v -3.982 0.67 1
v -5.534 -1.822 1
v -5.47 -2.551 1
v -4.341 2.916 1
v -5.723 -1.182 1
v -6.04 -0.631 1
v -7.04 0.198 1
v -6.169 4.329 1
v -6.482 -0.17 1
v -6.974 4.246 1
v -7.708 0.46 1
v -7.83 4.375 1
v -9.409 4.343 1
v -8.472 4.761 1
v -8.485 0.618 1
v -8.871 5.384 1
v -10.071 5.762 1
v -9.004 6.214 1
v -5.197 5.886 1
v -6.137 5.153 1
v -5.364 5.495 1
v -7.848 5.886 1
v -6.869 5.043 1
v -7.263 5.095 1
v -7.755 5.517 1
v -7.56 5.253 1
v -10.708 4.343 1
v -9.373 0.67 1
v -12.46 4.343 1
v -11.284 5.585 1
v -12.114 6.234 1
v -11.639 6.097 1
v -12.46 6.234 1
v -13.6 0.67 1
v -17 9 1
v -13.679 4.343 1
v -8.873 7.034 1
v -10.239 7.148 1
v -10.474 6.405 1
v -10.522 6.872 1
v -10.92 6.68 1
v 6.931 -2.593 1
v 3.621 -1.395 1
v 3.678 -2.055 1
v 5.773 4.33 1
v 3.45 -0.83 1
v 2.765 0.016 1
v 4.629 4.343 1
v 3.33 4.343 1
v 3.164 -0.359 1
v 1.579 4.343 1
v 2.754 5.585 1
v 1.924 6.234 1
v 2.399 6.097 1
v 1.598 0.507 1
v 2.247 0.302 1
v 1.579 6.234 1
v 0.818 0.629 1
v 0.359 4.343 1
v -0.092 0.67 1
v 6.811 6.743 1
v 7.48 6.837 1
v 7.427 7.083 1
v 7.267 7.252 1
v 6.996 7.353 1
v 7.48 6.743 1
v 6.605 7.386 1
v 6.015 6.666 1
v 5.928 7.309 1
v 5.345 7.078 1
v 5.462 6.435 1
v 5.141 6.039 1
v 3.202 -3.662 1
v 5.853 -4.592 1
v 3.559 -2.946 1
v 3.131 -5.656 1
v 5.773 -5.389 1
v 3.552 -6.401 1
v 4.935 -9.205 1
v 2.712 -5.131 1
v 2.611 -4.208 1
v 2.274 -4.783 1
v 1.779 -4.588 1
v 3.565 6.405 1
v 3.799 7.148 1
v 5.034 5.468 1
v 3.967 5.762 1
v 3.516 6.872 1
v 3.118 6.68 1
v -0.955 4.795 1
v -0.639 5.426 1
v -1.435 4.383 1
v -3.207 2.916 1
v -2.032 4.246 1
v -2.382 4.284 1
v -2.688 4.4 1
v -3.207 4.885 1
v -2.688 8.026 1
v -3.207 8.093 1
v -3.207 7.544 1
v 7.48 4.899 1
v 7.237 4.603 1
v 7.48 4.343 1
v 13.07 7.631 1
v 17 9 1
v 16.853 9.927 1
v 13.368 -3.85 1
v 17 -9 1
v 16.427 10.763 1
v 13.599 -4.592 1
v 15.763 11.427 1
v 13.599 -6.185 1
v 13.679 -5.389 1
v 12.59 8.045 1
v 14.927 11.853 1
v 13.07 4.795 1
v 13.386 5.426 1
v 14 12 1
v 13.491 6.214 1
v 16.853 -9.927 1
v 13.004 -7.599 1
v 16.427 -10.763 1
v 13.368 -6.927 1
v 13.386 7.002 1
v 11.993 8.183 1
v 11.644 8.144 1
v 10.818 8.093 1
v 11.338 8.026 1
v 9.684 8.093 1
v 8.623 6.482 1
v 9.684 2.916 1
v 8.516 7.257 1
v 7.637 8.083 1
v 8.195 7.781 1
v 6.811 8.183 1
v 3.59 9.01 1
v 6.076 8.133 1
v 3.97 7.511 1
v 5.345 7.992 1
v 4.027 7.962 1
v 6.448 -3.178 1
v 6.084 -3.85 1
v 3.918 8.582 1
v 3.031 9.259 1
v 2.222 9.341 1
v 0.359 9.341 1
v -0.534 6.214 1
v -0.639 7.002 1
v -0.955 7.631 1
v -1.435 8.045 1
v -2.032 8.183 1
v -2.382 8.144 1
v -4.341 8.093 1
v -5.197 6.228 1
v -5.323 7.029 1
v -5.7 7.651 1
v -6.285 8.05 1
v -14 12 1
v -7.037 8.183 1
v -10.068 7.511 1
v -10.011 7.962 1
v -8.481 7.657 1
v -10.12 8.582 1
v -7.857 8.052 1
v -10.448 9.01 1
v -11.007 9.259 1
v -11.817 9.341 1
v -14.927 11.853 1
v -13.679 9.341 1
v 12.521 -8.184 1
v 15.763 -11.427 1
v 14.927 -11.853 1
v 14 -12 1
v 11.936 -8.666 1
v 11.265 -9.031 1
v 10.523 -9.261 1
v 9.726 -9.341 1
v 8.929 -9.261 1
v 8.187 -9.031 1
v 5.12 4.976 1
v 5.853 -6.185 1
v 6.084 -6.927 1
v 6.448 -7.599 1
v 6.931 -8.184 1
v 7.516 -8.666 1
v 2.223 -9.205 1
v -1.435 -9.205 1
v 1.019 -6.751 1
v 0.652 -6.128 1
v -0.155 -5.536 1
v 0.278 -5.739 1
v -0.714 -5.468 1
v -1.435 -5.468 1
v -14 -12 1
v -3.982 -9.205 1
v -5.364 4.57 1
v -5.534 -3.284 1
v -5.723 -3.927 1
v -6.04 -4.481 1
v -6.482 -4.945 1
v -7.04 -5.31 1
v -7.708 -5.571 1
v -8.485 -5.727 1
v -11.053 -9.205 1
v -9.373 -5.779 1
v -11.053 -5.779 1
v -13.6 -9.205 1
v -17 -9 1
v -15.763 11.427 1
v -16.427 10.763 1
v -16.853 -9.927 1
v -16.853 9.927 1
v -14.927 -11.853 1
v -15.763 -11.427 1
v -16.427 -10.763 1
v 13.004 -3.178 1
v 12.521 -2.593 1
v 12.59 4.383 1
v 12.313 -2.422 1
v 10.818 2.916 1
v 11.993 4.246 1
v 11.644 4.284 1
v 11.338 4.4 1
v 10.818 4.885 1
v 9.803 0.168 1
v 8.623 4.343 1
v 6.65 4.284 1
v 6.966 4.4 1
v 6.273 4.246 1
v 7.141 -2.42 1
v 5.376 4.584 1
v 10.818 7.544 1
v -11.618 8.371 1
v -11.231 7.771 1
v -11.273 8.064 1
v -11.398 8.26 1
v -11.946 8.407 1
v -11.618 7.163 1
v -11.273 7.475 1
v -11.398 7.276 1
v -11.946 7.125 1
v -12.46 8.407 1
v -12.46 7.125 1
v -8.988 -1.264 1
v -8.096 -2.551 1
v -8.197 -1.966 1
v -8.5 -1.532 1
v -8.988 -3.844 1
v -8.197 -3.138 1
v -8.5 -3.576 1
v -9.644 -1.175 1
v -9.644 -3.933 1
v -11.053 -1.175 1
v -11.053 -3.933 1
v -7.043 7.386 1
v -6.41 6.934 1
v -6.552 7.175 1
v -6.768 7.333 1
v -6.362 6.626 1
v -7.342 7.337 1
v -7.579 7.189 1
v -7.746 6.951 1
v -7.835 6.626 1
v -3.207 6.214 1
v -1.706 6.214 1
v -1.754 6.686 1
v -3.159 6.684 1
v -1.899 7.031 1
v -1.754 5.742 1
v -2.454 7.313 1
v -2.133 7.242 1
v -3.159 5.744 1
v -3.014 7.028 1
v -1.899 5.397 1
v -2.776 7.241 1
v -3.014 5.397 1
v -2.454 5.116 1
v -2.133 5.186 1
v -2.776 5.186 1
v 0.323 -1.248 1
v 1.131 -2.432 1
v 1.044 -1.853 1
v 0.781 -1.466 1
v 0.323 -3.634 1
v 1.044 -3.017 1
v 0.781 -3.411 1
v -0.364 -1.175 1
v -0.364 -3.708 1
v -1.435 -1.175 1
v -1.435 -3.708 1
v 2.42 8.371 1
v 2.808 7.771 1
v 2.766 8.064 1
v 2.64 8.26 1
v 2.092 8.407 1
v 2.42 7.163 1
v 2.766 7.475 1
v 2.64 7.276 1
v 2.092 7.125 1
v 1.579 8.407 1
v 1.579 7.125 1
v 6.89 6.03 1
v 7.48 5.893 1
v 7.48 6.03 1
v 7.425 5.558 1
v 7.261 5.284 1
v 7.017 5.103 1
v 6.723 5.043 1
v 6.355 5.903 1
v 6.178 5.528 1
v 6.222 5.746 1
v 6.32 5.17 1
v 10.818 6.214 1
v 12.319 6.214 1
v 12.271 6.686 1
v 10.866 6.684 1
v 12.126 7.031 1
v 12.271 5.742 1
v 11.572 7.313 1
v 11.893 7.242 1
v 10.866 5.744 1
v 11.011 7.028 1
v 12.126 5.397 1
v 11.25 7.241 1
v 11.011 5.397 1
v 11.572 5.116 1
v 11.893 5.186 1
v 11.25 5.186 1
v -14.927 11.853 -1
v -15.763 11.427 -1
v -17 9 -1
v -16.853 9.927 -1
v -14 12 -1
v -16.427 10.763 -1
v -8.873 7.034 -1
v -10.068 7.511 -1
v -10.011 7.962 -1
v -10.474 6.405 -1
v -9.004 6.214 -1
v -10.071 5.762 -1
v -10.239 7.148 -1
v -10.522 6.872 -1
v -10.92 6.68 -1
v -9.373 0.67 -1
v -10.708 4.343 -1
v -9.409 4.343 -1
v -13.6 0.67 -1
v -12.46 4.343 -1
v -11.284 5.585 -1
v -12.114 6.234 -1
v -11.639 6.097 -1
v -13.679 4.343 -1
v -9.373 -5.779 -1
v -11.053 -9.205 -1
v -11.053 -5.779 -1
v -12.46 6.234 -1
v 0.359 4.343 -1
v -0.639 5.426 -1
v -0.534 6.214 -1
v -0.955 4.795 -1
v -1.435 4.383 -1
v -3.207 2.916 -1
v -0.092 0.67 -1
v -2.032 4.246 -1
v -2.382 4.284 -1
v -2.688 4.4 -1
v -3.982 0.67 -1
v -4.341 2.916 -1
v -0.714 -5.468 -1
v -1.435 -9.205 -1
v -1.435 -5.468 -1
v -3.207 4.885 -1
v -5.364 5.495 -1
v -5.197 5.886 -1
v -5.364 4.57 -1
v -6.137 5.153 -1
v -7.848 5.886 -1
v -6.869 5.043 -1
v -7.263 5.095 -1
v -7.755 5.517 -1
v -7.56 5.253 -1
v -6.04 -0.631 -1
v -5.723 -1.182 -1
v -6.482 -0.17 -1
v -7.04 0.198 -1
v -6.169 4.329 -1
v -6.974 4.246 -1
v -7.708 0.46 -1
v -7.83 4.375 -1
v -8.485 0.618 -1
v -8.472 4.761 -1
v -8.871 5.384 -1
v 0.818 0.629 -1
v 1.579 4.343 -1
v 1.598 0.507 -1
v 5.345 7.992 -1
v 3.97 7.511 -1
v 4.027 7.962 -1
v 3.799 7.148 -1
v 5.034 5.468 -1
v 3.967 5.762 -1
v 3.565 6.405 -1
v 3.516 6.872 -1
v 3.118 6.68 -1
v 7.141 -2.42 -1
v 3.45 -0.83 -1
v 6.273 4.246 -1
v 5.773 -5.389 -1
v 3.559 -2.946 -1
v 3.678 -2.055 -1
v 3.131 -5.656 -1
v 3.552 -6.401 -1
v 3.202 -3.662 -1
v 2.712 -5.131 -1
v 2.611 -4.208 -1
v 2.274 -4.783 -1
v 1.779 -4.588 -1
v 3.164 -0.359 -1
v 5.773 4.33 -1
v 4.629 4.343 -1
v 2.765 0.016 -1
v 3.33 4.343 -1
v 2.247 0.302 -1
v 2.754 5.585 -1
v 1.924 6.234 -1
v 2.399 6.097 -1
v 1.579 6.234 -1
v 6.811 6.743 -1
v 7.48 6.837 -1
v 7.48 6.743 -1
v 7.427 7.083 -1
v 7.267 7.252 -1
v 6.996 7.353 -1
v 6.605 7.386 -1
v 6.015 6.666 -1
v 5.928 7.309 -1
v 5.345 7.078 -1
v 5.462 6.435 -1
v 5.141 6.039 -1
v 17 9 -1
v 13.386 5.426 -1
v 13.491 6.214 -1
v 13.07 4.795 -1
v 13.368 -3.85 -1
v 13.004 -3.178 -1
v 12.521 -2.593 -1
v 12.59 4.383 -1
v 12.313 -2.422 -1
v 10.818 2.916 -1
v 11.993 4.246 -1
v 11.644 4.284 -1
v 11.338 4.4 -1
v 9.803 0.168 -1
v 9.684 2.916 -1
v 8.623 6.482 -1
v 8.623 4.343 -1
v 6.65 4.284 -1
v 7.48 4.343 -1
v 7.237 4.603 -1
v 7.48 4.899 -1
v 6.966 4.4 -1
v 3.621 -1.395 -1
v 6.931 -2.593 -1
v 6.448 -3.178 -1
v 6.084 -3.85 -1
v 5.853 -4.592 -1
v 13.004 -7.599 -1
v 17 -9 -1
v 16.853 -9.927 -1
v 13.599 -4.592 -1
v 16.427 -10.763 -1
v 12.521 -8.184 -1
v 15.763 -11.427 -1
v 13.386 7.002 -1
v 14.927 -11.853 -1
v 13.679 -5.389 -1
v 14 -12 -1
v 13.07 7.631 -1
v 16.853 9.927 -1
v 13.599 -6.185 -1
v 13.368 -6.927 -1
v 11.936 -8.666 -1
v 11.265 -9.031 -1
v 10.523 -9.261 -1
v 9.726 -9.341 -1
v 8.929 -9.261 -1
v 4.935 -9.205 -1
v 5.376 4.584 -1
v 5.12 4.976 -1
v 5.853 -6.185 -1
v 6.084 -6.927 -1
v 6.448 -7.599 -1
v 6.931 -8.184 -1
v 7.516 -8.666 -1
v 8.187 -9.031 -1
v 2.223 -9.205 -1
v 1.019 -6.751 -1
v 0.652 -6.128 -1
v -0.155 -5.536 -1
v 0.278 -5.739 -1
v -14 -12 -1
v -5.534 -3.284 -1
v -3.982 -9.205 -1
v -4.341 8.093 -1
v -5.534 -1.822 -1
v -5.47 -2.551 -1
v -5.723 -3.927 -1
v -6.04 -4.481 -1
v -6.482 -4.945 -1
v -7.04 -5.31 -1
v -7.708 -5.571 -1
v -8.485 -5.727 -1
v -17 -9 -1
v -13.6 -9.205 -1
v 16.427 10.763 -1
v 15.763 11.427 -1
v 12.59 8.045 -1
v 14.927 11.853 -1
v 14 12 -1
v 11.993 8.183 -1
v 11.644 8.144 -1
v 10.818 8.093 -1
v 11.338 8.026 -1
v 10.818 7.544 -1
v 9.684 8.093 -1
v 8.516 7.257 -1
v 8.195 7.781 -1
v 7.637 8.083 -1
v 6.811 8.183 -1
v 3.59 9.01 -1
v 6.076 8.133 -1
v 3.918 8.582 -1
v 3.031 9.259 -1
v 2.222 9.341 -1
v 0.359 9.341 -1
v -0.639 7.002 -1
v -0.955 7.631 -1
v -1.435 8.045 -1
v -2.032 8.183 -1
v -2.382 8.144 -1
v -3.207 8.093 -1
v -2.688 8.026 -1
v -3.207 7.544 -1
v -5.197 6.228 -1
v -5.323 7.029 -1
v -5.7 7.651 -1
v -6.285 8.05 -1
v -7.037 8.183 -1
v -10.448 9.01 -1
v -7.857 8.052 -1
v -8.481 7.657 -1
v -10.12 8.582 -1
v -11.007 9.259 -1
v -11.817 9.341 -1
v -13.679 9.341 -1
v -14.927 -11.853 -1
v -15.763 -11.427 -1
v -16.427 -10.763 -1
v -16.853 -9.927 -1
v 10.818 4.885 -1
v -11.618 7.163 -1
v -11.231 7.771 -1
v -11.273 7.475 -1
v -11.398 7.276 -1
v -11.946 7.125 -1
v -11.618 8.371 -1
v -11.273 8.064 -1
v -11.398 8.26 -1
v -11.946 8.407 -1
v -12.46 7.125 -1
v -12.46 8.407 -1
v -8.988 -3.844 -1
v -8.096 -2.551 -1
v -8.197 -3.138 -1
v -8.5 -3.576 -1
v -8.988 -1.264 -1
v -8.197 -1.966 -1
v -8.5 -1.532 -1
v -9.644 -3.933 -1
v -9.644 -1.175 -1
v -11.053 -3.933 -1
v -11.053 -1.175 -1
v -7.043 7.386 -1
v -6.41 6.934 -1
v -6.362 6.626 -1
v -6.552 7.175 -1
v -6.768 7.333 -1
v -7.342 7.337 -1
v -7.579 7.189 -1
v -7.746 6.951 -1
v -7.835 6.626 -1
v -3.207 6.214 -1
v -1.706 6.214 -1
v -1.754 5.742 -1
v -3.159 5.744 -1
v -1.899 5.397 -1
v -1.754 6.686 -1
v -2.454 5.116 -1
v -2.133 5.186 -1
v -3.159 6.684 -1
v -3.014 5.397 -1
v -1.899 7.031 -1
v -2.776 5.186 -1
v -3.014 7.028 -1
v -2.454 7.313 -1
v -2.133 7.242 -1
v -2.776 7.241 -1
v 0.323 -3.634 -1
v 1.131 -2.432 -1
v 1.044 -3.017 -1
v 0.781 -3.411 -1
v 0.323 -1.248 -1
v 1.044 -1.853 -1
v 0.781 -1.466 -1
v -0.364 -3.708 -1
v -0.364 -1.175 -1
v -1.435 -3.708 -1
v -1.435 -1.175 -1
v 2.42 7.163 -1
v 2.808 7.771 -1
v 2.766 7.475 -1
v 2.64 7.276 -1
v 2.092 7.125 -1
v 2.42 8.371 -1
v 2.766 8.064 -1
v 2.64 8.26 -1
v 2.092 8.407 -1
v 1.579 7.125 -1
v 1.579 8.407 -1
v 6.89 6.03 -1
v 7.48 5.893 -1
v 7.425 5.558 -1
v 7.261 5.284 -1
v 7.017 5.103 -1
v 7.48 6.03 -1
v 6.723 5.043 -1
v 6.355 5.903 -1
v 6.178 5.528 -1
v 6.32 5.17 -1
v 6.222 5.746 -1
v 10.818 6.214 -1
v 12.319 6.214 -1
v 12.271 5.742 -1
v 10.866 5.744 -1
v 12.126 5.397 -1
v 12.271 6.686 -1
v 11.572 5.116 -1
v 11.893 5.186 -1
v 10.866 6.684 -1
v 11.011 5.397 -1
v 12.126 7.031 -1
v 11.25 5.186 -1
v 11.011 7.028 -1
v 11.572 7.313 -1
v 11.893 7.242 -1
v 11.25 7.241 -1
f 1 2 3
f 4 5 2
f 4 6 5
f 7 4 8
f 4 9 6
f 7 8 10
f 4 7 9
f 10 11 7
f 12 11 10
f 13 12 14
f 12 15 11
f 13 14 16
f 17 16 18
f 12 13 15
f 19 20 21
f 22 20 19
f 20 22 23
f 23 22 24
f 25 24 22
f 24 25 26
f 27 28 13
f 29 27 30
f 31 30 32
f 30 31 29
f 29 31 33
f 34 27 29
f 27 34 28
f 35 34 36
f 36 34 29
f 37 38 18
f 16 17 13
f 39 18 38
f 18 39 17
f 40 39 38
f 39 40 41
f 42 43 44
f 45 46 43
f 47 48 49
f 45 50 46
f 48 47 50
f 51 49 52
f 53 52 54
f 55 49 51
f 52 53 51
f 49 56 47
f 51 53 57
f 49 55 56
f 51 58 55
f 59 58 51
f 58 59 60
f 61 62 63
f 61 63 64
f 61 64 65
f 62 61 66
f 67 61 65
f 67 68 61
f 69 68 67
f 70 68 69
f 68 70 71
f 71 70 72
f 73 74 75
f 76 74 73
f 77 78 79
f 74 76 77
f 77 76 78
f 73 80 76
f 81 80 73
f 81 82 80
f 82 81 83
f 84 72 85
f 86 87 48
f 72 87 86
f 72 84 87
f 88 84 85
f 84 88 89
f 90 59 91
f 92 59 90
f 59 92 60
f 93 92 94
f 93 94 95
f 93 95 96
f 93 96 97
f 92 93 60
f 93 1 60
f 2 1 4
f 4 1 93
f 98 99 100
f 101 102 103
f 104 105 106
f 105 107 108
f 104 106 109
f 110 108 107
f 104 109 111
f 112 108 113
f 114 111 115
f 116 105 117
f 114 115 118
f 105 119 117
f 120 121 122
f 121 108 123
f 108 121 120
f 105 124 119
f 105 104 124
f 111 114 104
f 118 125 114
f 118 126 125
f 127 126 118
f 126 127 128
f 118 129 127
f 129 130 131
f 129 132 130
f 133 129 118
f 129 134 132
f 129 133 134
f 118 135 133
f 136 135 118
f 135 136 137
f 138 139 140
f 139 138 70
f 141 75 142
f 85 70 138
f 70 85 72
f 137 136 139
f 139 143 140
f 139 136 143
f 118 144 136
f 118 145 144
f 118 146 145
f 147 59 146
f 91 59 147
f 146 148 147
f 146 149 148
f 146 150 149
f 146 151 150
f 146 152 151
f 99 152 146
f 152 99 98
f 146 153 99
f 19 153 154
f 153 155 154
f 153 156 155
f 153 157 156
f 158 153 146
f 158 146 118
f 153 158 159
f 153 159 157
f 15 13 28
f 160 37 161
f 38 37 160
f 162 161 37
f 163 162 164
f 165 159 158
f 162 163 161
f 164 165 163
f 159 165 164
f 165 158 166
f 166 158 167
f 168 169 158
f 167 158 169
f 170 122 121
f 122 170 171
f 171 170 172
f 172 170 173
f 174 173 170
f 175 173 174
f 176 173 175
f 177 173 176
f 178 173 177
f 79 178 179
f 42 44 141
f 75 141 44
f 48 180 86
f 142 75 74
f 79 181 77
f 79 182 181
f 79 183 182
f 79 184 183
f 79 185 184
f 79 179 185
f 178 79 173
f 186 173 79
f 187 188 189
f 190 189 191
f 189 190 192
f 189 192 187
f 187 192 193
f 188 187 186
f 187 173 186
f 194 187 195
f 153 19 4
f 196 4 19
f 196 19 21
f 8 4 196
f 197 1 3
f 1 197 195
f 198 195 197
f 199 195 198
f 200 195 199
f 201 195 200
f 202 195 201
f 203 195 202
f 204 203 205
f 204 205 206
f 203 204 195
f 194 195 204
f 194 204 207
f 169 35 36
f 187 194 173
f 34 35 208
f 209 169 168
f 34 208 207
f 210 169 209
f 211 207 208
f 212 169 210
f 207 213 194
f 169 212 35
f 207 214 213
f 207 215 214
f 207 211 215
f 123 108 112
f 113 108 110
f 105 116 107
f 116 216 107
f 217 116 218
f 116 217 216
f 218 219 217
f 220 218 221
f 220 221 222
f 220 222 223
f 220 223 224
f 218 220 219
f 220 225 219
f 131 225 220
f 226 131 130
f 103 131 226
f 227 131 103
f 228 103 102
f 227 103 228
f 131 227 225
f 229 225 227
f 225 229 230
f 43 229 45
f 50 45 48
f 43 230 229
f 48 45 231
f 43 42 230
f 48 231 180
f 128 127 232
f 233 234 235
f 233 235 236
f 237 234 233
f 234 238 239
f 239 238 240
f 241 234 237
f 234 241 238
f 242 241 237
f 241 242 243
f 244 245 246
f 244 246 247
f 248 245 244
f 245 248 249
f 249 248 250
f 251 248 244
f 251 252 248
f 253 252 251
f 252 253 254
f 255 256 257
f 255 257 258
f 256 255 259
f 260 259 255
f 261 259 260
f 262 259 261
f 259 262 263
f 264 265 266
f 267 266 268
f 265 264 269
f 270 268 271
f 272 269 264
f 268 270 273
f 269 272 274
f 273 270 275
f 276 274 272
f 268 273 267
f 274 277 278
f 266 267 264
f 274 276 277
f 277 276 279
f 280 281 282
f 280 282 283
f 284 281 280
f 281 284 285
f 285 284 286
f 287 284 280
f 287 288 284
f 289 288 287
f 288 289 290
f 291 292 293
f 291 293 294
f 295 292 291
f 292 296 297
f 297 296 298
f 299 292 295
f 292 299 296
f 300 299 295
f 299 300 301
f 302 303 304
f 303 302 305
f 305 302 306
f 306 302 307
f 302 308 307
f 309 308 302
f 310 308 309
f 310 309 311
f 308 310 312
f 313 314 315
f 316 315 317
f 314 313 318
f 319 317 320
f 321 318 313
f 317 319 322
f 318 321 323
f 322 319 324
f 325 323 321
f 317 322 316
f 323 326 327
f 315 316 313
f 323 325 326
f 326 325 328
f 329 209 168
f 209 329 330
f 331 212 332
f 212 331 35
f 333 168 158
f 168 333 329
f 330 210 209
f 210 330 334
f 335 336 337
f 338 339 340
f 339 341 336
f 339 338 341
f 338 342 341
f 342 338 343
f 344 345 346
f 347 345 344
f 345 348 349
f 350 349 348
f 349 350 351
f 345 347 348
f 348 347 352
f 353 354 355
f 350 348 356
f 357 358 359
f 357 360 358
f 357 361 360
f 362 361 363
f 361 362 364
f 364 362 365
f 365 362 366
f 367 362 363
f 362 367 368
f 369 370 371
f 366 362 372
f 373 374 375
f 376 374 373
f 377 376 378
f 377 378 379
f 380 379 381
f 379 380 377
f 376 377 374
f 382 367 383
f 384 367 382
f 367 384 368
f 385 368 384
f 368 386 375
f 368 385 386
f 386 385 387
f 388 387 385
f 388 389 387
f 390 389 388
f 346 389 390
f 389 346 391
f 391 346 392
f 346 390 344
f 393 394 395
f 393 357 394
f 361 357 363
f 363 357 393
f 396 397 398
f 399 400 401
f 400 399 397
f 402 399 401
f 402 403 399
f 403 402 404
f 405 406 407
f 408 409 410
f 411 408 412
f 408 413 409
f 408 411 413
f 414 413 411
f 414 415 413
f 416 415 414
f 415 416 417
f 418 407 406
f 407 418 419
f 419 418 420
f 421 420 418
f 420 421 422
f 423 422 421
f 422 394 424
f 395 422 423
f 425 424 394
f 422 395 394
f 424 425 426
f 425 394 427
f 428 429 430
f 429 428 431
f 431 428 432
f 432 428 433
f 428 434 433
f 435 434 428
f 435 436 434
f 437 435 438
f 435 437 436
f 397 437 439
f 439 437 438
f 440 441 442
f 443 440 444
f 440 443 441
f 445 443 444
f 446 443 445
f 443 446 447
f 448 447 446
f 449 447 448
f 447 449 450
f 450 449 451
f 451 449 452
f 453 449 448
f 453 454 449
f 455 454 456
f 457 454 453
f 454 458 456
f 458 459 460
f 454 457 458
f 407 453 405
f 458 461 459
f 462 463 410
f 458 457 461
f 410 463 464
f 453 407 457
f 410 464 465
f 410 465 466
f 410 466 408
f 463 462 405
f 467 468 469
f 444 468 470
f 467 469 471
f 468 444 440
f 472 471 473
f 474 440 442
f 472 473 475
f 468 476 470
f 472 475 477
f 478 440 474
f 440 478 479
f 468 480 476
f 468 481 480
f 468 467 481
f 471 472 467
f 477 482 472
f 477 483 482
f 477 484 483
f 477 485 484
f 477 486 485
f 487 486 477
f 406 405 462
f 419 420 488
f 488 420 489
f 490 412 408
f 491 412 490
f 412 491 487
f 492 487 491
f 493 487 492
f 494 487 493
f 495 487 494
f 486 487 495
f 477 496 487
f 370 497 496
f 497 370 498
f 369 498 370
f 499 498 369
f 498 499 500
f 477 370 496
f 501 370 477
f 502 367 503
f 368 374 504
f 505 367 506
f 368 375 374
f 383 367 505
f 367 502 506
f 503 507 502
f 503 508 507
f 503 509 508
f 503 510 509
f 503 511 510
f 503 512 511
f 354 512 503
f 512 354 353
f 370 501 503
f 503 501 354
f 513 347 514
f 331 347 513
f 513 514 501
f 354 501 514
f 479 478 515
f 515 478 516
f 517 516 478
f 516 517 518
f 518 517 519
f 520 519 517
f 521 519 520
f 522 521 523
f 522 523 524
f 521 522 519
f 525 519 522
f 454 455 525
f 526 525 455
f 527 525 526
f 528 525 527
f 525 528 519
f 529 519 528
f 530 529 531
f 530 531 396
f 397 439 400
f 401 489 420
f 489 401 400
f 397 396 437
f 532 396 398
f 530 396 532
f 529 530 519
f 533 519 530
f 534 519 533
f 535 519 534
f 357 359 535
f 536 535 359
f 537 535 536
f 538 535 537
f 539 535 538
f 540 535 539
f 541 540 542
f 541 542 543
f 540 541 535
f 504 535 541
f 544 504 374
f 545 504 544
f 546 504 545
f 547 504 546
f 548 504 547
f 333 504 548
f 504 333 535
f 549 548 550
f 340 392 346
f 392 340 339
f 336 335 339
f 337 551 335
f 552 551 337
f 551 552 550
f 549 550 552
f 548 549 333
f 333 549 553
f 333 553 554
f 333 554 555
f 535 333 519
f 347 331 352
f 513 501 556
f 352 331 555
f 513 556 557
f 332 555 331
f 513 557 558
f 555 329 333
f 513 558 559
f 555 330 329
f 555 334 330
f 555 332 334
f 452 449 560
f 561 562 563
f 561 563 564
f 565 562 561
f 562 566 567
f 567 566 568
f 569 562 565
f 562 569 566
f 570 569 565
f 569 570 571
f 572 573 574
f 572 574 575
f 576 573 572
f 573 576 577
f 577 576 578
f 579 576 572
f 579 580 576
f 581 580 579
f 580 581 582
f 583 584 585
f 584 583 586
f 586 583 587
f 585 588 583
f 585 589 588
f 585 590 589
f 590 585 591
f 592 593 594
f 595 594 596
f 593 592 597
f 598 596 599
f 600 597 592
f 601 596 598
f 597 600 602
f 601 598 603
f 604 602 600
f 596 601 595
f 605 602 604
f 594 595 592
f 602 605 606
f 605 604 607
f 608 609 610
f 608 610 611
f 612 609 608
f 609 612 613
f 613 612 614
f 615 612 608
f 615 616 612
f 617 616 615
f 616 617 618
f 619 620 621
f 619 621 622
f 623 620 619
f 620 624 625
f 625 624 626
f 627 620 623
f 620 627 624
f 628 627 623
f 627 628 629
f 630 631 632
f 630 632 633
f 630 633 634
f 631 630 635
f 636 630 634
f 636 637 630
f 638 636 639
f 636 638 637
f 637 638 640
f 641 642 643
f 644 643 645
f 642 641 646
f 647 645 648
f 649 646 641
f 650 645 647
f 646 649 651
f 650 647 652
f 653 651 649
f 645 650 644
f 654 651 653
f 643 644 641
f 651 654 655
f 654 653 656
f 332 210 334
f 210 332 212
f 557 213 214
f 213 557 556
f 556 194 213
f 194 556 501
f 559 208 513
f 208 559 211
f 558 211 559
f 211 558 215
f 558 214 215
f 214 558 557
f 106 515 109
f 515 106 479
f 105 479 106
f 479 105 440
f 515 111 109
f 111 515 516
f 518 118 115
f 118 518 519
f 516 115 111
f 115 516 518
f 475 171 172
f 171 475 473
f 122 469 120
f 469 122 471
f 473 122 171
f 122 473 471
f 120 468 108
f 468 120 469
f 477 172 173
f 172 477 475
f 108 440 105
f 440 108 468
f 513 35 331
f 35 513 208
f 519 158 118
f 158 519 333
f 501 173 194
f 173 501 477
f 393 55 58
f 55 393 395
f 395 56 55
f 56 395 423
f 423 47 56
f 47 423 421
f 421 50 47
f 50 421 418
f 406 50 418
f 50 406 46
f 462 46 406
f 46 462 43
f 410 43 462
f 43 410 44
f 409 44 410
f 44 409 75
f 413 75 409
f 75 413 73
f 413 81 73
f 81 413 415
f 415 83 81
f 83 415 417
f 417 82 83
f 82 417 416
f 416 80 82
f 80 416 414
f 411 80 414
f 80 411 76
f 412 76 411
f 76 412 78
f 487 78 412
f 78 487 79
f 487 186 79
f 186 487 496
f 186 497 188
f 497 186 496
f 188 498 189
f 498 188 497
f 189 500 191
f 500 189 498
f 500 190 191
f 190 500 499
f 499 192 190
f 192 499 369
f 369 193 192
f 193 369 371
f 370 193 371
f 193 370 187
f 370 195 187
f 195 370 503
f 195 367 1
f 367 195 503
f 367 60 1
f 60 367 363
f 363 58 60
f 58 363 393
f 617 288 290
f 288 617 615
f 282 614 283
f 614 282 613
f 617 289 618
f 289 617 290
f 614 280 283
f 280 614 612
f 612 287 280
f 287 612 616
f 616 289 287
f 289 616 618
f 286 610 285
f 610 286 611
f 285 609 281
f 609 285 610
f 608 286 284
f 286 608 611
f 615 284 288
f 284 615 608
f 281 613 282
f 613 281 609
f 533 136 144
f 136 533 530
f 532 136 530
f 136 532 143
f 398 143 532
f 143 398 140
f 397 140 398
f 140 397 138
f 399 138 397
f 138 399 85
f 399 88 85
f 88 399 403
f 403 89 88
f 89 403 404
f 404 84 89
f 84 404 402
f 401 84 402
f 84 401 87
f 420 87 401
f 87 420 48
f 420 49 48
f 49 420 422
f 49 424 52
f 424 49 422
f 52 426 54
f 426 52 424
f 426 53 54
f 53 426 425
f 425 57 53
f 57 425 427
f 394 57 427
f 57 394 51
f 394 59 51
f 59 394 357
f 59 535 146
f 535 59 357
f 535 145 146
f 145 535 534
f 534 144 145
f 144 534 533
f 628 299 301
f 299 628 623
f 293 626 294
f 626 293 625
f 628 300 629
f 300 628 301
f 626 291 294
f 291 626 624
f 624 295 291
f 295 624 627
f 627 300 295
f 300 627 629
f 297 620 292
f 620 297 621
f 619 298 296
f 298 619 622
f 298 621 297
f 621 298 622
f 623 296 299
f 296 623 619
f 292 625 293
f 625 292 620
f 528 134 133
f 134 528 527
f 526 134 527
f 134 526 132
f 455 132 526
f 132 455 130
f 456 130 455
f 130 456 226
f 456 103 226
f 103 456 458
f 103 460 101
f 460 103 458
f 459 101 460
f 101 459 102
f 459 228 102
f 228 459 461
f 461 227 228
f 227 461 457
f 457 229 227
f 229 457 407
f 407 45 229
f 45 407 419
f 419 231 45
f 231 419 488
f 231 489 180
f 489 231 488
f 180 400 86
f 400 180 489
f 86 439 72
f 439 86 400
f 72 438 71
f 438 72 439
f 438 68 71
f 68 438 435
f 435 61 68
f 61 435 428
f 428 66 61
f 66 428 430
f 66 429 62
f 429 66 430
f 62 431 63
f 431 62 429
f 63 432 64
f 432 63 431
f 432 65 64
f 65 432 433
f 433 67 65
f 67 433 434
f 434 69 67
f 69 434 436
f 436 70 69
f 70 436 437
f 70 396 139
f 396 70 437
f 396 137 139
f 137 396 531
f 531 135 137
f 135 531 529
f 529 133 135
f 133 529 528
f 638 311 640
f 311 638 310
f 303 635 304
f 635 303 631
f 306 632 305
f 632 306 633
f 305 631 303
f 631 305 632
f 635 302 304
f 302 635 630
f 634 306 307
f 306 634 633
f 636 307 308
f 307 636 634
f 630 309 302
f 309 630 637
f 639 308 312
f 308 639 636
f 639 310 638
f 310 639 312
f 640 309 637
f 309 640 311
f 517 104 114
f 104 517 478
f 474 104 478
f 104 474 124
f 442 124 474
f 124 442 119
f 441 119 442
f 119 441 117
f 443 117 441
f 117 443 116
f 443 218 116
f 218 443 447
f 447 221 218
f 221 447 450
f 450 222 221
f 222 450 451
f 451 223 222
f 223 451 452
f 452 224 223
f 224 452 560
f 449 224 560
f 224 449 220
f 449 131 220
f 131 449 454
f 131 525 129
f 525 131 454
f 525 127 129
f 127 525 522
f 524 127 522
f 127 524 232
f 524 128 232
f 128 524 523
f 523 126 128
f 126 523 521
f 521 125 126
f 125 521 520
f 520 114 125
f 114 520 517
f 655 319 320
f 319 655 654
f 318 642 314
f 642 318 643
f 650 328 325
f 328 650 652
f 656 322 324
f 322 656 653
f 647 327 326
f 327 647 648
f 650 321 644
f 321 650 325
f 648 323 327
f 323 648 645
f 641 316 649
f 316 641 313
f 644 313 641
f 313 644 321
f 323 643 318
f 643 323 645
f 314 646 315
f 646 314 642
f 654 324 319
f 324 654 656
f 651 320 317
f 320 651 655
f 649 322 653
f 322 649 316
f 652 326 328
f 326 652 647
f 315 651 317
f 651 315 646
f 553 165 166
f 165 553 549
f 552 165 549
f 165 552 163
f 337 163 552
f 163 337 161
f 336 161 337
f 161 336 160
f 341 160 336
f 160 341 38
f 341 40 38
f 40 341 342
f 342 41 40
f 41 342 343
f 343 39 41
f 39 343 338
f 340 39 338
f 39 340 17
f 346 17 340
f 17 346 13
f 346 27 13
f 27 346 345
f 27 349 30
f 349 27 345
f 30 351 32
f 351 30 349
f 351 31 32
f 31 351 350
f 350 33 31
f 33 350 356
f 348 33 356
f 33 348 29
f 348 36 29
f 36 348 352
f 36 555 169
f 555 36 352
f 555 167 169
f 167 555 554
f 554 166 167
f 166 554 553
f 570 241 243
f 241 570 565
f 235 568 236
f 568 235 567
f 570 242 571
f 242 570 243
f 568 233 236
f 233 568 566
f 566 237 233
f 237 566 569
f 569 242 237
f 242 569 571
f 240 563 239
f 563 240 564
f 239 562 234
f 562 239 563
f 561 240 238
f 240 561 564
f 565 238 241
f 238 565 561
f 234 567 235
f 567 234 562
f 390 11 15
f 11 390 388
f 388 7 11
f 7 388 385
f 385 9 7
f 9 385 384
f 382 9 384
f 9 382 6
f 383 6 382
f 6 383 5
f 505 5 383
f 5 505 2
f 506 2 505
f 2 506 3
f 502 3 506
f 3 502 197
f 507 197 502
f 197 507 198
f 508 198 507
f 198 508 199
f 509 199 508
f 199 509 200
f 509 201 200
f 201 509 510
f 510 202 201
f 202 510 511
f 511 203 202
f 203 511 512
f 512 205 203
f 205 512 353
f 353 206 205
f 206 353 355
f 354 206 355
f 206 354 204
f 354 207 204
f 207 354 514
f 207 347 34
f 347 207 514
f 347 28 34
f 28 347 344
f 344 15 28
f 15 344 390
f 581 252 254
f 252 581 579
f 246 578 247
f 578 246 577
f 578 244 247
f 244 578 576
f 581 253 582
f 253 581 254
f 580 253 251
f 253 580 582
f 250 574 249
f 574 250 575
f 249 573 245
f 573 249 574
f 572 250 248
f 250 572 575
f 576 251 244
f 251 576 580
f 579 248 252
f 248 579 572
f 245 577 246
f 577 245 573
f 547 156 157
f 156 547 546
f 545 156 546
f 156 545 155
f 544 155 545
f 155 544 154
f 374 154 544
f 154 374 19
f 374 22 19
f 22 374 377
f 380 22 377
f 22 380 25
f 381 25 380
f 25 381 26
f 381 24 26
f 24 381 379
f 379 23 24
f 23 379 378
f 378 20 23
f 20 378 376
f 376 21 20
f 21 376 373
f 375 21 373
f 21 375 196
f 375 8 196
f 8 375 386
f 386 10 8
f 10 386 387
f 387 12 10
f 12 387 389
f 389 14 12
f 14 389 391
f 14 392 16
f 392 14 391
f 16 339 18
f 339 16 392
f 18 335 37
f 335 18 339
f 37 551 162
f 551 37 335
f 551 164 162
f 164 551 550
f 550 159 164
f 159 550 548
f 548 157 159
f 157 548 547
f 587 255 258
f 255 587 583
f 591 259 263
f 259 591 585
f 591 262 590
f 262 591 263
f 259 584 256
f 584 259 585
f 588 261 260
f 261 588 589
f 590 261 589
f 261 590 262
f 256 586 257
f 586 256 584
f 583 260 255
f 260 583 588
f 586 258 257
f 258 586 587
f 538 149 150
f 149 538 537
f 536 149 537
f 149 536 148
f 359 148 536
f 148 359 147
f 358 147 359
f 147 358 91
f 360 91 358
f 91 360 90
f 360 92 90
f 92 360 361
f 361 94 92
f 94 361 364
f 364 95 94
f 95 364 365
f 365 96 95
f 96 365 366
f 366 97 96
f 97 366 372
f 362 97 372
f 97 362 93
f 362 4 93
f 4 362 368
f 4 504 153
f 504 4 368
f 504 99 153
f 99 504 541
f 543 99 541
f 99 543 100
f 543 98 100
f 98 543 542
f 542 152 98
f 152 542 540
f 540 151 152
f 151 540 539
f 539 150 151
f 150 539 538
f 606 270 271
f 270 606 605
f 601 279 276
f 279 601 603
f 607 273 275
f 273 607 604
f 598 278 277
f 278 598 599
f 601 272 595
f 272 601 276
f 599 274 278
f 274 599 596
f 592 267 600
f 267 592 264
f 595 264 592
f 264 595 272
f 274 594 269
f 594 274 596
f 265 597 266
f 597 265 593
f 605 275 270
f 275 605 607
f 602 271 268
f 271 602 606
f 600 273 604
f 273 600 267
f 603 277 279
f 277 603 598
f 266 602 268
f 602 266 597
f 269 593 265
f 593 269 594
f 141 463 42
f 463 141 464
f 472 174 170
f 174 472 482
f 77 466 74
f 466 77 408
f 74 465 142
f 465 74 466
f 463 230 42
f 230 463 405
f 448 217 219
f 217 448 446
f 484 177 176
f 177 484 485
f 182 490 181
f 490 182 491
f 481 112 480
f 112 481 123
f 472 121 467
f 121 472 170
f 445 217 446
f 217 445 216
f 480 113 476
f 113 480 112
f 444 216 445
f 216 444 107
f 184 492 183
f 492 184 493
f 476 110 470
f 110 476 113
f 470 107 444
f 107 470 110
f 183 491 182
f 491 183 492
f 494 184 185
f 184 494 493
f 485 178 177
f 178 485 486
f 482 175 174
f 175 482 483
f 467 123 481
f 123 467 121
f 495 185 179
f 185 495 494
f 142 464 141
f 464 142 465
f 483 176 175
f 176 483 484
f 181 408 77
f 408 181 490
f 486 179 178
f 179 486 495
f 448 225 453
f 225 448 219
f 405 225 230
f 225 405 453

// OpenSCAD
logo();

module logo()
{
	color("green")
	difference()
	{
		union()
		{
			cube([34,18,2],center=true);
			cube([28,24,2],center=true);
			for(i=[-1,1])
			{
				translate([i*(34/2-3), 18/2,0])
					cylinder(r=3,h=2,center=true,$fn=20);
				translate([i*(34/2-3),-18/2 ,0])
					cylinder(r=3,h=2,center=true,$fn=20);
			}
		}
		translate([0,0,-2.5])
		union()
		{
			poly_path3033(5);
			poly_path3045(5);
			poly_path2894(5);
			poly_path3047(5);
			poly_rect3668(5);
			poly_path3049(5);
			poly_path3039(5);
			poly_path3036(5);
			poly_path3041(5);
			poly_path3043(5);
		}
	}

}

// Module names are of the form poly_<inkscape-path-id>().  As a result,
// you can associate a polygon in this OpenSCAD program with the corresponding
// SVG element in the Inkscape document by looking for the XML element with
// the attribute id="inkscape-path-id".

// fudge value is used to ensure that subtracted solids are a tad taller
// in the z dimension than the polygon being subtracted from.  This helps
// keep the resulting .stl file manifold.
fudge = 0.1;

module poly_path3033(h)
{
  scale([25.4/90, -25.4/90, 1]) union()
  {
    difference()
    {
       linear_extrude(height=h)
         polygon([[-5.085352,19.374736],[-5.085352,32.616923],[-14.108789,32.616923],[-14.108789,-2.375264],[-0.327539,-2.375264],[2.898034,-2.230225],[5.660724,-1.795160],[7.960533,-1.070069],[9.797461,-0.054952],[11.212483,1.273679],[12.223219,2.939211],[12.829670,4.941647],[13.031836,7.280986],[12.609938,10.439205],[11.344336,12.976298],[9.252518,14.909905],[6.305273,16.257548],[8.057207,16.948966],[9.609961,18.179423],[11.092361,20.042714],[12.586523,22.679423],[17.484961,32.616923],[7.875586,32.616923],[3.609961,23.921611],[2.309164,21.712635],[0.984961,20.335673],[-0.550209,19.614980],[-2.530664,19.374736],[-5.085352,19.374736]]);
       translate([0, 0, -fudge])
         linear_extrude(height=h+2*fudge)
           polygon([[-1.288477,13.140361],[1.143149,12.876704],[2.766211,12.085673],[3.697835,10.691159],[4.008398,8.616923],[3.697835,6.566162],[2.766211,5.195048],[1.143149,4.421632],[-1.288477,4.163798],[-5.085352,4.163798],[-5.085352,13.140361]]);
    }
  }
}

module poly_path3045(h)
{
  scale([25.4/90, -25.4/90, 1]) union()
  {
    difference()
    {
       linear_extrude(height=h)
         polygon([[5.593479,-22.090523],[5.593479,-15.387723],[1.272512,-15.387723],[1.272512,-33.099722],[7.871806,-33.099722],[10.739349,-32.806091],[12.720269,-31.925249],[13.881868,-30.409693],[14.269083,-28.212017],[14.067053,-26.613420],[13.461006,-25.329220],[12.459317,-24.350486],[11.047998,-23.668350],[12.630482,-22.695554],[14.055840,-20.417788],[16.401508,-15.387723],[11.799959,-15.387723],[9.757320,-19.789030],[8.500311,-21.604125],[6.816817,-22.090523],[5.593479,-22.090523]]);
       translate([0, 0, -fudge])
         linear_extrude(height=h+2*fudge)
           polygon([[7.411652,-25.246177],[8.576061,-25.379632],[9.353281,-25.780028],[9.799399,-26.485890],[9.948116,-27.535806],[9.799399,-28.573840],[9.353281,-29.267857],[8.576061,-29.659337],[7.411652,-29.789845],[5.593479,-29.789845],[5.593479,-25.246177]]);
    }
  }
}

module poly_path2894(h)
{
  scale([25.4/90, -25.4/90, 1]) union()
  {
    linear_extrude(height=h)
      polygon([[48.469119,19.093223],[48.184557,21.916021],[47.368419,24.545185],[46.077029,26.924390],[44.366710,28.997314],[42.293787,30.707632],[39.914581,31.999022],[37.285418,32.815160],[34.462619,33.099722],[31.639821,32.815160],[29.010657,31.999022],[26.631452,30.707632],[24.558528,28.997314],[22.848209,26.924390],[21.556819,24.545185],[20.740681,21.916021],[20.456119,19.093223],[20.740681,16.270425],[21.556819,13.641261],[22.848209,11.262055],[24.558528,9.189132],[26.631452,7.478813],[29.010657,6.187423],[31.639821,5.371285],[34.462619,5.086723],[37.285418,5.371285],[39.914581,6.187423],[42.293787,7.478813],[44.366710,9.189132],[46.077029,11.262055],[47.368419,13.641261],[48.184557,16.270425],[48.469119,19.093223]]);
  }
}

module poly_path3047(h)
{
  scale([25.4/90, -25.4/90, 1]) union()
  {
    difference()
    {
       linear_extrude(height=h)
         polygon([[30.554078,-22.968411],[30.554078,-15.387723],[26.502470,-15.387723],[26.502470,-17.357041],[25.643881,-16.310099],[24.684297,-15.589400],[23.564768,-15.180114],[22.226395,-15.043685],[20.455918,-15.343236],[19.050203,-16.241885],[18.141116,-17.629897],[17.838088,-19.373813],[18.216873,-21.399477],[19.353232,-22.802324],[21.311694,-23.620890],[24.134355,-23.893754],[26.502470,-23.893754],[26.502470,-24.225928],[26.314472,-25.097877],[25.750509,-25.696985],[24.788106,-26.052877],[23.404841,-26.171518],[21.003057,-25.898662],[18.937970,-25.080090],[18.937970,-28.318787],[21.530551,-28.817049],[24.134355,-28.994999],[27.060821,-28.639088],[29.038934,-27.571395],[30.175282,-25.714771],[30.554078,-22.968411]]);
       translate([0, 0, -fudge])
         linear_extrude(height=h+2*fudge)
           polygon([[24.414937,-21.366857],[22.518201,-20.916049],[22.046819,-20.358468],[21.889696,-19.587353],[22.394745,-18.317974],[23.820103,-17.867166],[24.863863,-18.080705],[25.728062,-18.721328],[26.308861,-19.694120],[26.502470,-20.880460],[26.502470,-21.366857],[24.414937,-21.366857]]);
    }
  }
}

module poly_rect3668(h)
{
  scale([25.4/90, -25.4/90, 1]) union()
  {
    linear_extrude(height=h)
      polygon([[34.735515,-0.594379],[45.105917,10.103823],[34.494317,20.419423],[24.123915,9.721221]]);
  }
}

module poly_path3049(h)
{
  scale([25.4/90, -25.4/90, 1]) union()
  {
    difference()
    {
       linear_extrude(height=h)
         polygon([[38.331823,-17.309588],[38.331823,-10.333931],[34.313884,-10.333931],[34.313884,-28.674688],[38.331823,-28.674688],[38.331823,-26.729097],[40.172445,-28.437421],[41.258288,-28.855594],[42.495667,-28.994999],[44.611244,-28.505625],[46.311584,-27.037544],[47.431097,-24.810191],[47.804279,-22.019342],[47.431097,-19.225518],[46.311584,-16.989277],[44.611244,-15.530084],[42.495667,-15.043685],[41.258288,-15.180114],[40.172445,-15.589400],[38.331823,-17.309588]]);
       translate([0, 0, -fudge])
         linear_extrude(height=h+2*fudge)
           polygon([[41.002961,-25.910525],[39.860988,-25.658421],[39.016442,-24.902139],[38.502973,-23.683173],[38.331823,-22.019342],[38.502973,-20.352536],[39.016442,-19.124682],[39.860988,-18.377288],[41.002961,-18.128159],[42.139313,-18.377288],[42.967042,-19.124682],[43.480500,-20.346605],[43.651660,-22.019342],[43.480500,-23.692070],[42.967042,-24.914002],[42.139313,-25.661387]]);
    }
  }
}

module poly_path3039(h)
{
  scale([25.4/90, -25.4/90, 1]) union()
  {
    difference()
    {
       linear_extrude(height=h)
         polygon([[-44.148152,-22.090523],[-44.148152,-15.387723],[-48.469119,-15.387723],[-48.469119,-33.099722],[-41.869825,-33.099722],[-39.002282,-32.806091],[-37.021362,-31.925249],[-35.859762,-30.409693],[-35.472548,-28.212017],[-35.674578,-26.613420],[-36.280625,-25.329220],[-37.282314,-24.350486],[-38.693633,-23.668350],[-37.111149,-22.695554],[-35.685791,-20.417788],[-33.340122,-15.387723],[-37.941672,-15.387723],[-39.984311,-19.789030],[-41.241320,-21.604125],[-42.924813,-22.090523],[-44.148152,-22.090523]]);
       translate([0, 0, -fudge])
         linear_extrude(height=h+2*fudge)
           polygon([[-42.329979,-25.246177],[-41.165570,-25.379632],[-40.388349,-25.780028],[-39.942232,-26.485890],[-39.793515,-27.535806],[-39.942232,-28.573840],[-40.388349,-29.267857],[-41.165570,-29.659337],[-42.329979,-29.789845],[-44.148152,-29.789845],[-44.148152,-25.246177]]);
    }
  }
}

module poly_path3036(h)
{
  scale([25.4/90, -25.4/90, 1]) union()
  {
    difference()
    {
       linear_extrude(height=h)
         polygon([[-48.187968,-2.375264],[-33.211406,-2.375264],[-30.066400,-2.189209],[-27.311034,-1.631098],[-24.945307,-0.700929],[-22.969218,0.601298],[-21.400388,2.236080],[-20.279789,4.187257],[-19.607420,6.454830],[-19.383281,9.038798],[-19.607420,11.634512],[-20.279789,13.913812],[-21.400388,15.876699],[-22.969218,17.523173],[-24.945307,18.815172],[-27.311034,19.738026],[-30.066400,20.291735],[-33.211406,20.476298],[-39.164531,20.476298],[-39.164531,32.616923],[-48.187968,32.616923],[-48.187968,-2.375264]]);
       translate([0, 0, -fudge])
         linear_extrude(height=h+2*fudge)
           polygon([[-39.164531,4.163798],[-39.164531,13.937236],[-34.172343,13.937236],[-31.846186,13.620844],[-30.117656,12.671611],[-29.045407,11.118893],[-28.687968,9.038798],[-29.045407,6.964599],[-30.117656,5.429423],[-31.846186,4.480226],[-34.172343,4.163798]]);
    }
  }
}

module poly_path3041(h)
{
  scale([25.4/90, -25.4/90, 1]) union()
  {
    difference()
    {
       linear_extrude(height=h)
         polygon([[-18.413144,-22.066796],[-18.413144,-20.856733],[-27.807039,-20.856733],[-27.478761,-19.548794],[-26.785719,-18.614558],[-25.736347,-18.054012],[-24.339042,-17.867166],[-21.746461,-18.258656],[-19.007978,-19.468720],[-19.007978,-16.194432],[-21.858694,-15.340270],[-24.709411,-15.043685],[-27.742509,-15.500425],[-30.018028,-16.870643],[-31.432164,-19.077225],[-31.903541,-22.019342],[-31.440581,-24.922893],[-30.051697,-27.132451],[-27.840713,-28.529352],[-24.933877,-28.994999],[-22.268353,-28.523420],[-20.197648,-27.108725],[-18.859281,-24.905098],[-18.413144,-22.066796]]);
       translate([0, 0, -fudge])
         linear_extrude(height=h+2*fudge)
           polygon([[-22.543315,-23.478536],[-22.711673,-24.569958],[-23.216713,-25.424127],[-23.982709,-25.984663],[-24.956324,-26.171518],[-26.014124,-25.996526],[-26.853060,-25.471581],[-27.445092,-24.629275],[-27.762146,-23.478536]]);
    }
  }
}

module poly_path3043(h)
{
  scale([25.4/90, -25.4/90, 1]) union()
  {
    difference()
    {
       linear_extrude(height=h)
         polygon([[-11.364917,-17.309588],[-11.364917,-10.333931],[-15.382855,-10.333931],[-15.382855,-28.674688],[-11.364917,-28.674688],[-11.364917,-26.729097],[-9.524297,-28.437421],[-8.438450,-28.855594],[-7.201076,-28.994999],[-5.085494,-28.505625],[-3.385157,-27.037544],[-2.265644,-24.810191],[-1.892459,-22.019342],[-2.265644,-19.225518],[-3.385157,-16.989277],[-5.085494,-15.530084],[-7.201076,-15.043685],[-8.438450,-15.180114],[-9.524297,-15.589400],[-11.364917,-17.309588]]);
       translate([0, 0, -fudge])
         linear_extrude(height=h+2*fudge)
           polygon([[-8.693773,-25.910525],[-9.835749,-25.658421],[-10.680296,-24.902139],[-11.193766,-23.683173],[-11.364917,-22.019342],[-11.193766,-20.352536],[-10.680296,-19.124682],[-9.835749,-18.377288],[-8.693773,-18.128159],[-7.557423,-18.377288],[-6.729698,-19.124682],[-6.216240,-20.346605],[-6.045077,-22.019342],[-6.216240,-23.692070],[-6.729698,-24.914002],[-7.557423,-25.661387],[-8.693773,-25.910525]]);
    }
  }
}
